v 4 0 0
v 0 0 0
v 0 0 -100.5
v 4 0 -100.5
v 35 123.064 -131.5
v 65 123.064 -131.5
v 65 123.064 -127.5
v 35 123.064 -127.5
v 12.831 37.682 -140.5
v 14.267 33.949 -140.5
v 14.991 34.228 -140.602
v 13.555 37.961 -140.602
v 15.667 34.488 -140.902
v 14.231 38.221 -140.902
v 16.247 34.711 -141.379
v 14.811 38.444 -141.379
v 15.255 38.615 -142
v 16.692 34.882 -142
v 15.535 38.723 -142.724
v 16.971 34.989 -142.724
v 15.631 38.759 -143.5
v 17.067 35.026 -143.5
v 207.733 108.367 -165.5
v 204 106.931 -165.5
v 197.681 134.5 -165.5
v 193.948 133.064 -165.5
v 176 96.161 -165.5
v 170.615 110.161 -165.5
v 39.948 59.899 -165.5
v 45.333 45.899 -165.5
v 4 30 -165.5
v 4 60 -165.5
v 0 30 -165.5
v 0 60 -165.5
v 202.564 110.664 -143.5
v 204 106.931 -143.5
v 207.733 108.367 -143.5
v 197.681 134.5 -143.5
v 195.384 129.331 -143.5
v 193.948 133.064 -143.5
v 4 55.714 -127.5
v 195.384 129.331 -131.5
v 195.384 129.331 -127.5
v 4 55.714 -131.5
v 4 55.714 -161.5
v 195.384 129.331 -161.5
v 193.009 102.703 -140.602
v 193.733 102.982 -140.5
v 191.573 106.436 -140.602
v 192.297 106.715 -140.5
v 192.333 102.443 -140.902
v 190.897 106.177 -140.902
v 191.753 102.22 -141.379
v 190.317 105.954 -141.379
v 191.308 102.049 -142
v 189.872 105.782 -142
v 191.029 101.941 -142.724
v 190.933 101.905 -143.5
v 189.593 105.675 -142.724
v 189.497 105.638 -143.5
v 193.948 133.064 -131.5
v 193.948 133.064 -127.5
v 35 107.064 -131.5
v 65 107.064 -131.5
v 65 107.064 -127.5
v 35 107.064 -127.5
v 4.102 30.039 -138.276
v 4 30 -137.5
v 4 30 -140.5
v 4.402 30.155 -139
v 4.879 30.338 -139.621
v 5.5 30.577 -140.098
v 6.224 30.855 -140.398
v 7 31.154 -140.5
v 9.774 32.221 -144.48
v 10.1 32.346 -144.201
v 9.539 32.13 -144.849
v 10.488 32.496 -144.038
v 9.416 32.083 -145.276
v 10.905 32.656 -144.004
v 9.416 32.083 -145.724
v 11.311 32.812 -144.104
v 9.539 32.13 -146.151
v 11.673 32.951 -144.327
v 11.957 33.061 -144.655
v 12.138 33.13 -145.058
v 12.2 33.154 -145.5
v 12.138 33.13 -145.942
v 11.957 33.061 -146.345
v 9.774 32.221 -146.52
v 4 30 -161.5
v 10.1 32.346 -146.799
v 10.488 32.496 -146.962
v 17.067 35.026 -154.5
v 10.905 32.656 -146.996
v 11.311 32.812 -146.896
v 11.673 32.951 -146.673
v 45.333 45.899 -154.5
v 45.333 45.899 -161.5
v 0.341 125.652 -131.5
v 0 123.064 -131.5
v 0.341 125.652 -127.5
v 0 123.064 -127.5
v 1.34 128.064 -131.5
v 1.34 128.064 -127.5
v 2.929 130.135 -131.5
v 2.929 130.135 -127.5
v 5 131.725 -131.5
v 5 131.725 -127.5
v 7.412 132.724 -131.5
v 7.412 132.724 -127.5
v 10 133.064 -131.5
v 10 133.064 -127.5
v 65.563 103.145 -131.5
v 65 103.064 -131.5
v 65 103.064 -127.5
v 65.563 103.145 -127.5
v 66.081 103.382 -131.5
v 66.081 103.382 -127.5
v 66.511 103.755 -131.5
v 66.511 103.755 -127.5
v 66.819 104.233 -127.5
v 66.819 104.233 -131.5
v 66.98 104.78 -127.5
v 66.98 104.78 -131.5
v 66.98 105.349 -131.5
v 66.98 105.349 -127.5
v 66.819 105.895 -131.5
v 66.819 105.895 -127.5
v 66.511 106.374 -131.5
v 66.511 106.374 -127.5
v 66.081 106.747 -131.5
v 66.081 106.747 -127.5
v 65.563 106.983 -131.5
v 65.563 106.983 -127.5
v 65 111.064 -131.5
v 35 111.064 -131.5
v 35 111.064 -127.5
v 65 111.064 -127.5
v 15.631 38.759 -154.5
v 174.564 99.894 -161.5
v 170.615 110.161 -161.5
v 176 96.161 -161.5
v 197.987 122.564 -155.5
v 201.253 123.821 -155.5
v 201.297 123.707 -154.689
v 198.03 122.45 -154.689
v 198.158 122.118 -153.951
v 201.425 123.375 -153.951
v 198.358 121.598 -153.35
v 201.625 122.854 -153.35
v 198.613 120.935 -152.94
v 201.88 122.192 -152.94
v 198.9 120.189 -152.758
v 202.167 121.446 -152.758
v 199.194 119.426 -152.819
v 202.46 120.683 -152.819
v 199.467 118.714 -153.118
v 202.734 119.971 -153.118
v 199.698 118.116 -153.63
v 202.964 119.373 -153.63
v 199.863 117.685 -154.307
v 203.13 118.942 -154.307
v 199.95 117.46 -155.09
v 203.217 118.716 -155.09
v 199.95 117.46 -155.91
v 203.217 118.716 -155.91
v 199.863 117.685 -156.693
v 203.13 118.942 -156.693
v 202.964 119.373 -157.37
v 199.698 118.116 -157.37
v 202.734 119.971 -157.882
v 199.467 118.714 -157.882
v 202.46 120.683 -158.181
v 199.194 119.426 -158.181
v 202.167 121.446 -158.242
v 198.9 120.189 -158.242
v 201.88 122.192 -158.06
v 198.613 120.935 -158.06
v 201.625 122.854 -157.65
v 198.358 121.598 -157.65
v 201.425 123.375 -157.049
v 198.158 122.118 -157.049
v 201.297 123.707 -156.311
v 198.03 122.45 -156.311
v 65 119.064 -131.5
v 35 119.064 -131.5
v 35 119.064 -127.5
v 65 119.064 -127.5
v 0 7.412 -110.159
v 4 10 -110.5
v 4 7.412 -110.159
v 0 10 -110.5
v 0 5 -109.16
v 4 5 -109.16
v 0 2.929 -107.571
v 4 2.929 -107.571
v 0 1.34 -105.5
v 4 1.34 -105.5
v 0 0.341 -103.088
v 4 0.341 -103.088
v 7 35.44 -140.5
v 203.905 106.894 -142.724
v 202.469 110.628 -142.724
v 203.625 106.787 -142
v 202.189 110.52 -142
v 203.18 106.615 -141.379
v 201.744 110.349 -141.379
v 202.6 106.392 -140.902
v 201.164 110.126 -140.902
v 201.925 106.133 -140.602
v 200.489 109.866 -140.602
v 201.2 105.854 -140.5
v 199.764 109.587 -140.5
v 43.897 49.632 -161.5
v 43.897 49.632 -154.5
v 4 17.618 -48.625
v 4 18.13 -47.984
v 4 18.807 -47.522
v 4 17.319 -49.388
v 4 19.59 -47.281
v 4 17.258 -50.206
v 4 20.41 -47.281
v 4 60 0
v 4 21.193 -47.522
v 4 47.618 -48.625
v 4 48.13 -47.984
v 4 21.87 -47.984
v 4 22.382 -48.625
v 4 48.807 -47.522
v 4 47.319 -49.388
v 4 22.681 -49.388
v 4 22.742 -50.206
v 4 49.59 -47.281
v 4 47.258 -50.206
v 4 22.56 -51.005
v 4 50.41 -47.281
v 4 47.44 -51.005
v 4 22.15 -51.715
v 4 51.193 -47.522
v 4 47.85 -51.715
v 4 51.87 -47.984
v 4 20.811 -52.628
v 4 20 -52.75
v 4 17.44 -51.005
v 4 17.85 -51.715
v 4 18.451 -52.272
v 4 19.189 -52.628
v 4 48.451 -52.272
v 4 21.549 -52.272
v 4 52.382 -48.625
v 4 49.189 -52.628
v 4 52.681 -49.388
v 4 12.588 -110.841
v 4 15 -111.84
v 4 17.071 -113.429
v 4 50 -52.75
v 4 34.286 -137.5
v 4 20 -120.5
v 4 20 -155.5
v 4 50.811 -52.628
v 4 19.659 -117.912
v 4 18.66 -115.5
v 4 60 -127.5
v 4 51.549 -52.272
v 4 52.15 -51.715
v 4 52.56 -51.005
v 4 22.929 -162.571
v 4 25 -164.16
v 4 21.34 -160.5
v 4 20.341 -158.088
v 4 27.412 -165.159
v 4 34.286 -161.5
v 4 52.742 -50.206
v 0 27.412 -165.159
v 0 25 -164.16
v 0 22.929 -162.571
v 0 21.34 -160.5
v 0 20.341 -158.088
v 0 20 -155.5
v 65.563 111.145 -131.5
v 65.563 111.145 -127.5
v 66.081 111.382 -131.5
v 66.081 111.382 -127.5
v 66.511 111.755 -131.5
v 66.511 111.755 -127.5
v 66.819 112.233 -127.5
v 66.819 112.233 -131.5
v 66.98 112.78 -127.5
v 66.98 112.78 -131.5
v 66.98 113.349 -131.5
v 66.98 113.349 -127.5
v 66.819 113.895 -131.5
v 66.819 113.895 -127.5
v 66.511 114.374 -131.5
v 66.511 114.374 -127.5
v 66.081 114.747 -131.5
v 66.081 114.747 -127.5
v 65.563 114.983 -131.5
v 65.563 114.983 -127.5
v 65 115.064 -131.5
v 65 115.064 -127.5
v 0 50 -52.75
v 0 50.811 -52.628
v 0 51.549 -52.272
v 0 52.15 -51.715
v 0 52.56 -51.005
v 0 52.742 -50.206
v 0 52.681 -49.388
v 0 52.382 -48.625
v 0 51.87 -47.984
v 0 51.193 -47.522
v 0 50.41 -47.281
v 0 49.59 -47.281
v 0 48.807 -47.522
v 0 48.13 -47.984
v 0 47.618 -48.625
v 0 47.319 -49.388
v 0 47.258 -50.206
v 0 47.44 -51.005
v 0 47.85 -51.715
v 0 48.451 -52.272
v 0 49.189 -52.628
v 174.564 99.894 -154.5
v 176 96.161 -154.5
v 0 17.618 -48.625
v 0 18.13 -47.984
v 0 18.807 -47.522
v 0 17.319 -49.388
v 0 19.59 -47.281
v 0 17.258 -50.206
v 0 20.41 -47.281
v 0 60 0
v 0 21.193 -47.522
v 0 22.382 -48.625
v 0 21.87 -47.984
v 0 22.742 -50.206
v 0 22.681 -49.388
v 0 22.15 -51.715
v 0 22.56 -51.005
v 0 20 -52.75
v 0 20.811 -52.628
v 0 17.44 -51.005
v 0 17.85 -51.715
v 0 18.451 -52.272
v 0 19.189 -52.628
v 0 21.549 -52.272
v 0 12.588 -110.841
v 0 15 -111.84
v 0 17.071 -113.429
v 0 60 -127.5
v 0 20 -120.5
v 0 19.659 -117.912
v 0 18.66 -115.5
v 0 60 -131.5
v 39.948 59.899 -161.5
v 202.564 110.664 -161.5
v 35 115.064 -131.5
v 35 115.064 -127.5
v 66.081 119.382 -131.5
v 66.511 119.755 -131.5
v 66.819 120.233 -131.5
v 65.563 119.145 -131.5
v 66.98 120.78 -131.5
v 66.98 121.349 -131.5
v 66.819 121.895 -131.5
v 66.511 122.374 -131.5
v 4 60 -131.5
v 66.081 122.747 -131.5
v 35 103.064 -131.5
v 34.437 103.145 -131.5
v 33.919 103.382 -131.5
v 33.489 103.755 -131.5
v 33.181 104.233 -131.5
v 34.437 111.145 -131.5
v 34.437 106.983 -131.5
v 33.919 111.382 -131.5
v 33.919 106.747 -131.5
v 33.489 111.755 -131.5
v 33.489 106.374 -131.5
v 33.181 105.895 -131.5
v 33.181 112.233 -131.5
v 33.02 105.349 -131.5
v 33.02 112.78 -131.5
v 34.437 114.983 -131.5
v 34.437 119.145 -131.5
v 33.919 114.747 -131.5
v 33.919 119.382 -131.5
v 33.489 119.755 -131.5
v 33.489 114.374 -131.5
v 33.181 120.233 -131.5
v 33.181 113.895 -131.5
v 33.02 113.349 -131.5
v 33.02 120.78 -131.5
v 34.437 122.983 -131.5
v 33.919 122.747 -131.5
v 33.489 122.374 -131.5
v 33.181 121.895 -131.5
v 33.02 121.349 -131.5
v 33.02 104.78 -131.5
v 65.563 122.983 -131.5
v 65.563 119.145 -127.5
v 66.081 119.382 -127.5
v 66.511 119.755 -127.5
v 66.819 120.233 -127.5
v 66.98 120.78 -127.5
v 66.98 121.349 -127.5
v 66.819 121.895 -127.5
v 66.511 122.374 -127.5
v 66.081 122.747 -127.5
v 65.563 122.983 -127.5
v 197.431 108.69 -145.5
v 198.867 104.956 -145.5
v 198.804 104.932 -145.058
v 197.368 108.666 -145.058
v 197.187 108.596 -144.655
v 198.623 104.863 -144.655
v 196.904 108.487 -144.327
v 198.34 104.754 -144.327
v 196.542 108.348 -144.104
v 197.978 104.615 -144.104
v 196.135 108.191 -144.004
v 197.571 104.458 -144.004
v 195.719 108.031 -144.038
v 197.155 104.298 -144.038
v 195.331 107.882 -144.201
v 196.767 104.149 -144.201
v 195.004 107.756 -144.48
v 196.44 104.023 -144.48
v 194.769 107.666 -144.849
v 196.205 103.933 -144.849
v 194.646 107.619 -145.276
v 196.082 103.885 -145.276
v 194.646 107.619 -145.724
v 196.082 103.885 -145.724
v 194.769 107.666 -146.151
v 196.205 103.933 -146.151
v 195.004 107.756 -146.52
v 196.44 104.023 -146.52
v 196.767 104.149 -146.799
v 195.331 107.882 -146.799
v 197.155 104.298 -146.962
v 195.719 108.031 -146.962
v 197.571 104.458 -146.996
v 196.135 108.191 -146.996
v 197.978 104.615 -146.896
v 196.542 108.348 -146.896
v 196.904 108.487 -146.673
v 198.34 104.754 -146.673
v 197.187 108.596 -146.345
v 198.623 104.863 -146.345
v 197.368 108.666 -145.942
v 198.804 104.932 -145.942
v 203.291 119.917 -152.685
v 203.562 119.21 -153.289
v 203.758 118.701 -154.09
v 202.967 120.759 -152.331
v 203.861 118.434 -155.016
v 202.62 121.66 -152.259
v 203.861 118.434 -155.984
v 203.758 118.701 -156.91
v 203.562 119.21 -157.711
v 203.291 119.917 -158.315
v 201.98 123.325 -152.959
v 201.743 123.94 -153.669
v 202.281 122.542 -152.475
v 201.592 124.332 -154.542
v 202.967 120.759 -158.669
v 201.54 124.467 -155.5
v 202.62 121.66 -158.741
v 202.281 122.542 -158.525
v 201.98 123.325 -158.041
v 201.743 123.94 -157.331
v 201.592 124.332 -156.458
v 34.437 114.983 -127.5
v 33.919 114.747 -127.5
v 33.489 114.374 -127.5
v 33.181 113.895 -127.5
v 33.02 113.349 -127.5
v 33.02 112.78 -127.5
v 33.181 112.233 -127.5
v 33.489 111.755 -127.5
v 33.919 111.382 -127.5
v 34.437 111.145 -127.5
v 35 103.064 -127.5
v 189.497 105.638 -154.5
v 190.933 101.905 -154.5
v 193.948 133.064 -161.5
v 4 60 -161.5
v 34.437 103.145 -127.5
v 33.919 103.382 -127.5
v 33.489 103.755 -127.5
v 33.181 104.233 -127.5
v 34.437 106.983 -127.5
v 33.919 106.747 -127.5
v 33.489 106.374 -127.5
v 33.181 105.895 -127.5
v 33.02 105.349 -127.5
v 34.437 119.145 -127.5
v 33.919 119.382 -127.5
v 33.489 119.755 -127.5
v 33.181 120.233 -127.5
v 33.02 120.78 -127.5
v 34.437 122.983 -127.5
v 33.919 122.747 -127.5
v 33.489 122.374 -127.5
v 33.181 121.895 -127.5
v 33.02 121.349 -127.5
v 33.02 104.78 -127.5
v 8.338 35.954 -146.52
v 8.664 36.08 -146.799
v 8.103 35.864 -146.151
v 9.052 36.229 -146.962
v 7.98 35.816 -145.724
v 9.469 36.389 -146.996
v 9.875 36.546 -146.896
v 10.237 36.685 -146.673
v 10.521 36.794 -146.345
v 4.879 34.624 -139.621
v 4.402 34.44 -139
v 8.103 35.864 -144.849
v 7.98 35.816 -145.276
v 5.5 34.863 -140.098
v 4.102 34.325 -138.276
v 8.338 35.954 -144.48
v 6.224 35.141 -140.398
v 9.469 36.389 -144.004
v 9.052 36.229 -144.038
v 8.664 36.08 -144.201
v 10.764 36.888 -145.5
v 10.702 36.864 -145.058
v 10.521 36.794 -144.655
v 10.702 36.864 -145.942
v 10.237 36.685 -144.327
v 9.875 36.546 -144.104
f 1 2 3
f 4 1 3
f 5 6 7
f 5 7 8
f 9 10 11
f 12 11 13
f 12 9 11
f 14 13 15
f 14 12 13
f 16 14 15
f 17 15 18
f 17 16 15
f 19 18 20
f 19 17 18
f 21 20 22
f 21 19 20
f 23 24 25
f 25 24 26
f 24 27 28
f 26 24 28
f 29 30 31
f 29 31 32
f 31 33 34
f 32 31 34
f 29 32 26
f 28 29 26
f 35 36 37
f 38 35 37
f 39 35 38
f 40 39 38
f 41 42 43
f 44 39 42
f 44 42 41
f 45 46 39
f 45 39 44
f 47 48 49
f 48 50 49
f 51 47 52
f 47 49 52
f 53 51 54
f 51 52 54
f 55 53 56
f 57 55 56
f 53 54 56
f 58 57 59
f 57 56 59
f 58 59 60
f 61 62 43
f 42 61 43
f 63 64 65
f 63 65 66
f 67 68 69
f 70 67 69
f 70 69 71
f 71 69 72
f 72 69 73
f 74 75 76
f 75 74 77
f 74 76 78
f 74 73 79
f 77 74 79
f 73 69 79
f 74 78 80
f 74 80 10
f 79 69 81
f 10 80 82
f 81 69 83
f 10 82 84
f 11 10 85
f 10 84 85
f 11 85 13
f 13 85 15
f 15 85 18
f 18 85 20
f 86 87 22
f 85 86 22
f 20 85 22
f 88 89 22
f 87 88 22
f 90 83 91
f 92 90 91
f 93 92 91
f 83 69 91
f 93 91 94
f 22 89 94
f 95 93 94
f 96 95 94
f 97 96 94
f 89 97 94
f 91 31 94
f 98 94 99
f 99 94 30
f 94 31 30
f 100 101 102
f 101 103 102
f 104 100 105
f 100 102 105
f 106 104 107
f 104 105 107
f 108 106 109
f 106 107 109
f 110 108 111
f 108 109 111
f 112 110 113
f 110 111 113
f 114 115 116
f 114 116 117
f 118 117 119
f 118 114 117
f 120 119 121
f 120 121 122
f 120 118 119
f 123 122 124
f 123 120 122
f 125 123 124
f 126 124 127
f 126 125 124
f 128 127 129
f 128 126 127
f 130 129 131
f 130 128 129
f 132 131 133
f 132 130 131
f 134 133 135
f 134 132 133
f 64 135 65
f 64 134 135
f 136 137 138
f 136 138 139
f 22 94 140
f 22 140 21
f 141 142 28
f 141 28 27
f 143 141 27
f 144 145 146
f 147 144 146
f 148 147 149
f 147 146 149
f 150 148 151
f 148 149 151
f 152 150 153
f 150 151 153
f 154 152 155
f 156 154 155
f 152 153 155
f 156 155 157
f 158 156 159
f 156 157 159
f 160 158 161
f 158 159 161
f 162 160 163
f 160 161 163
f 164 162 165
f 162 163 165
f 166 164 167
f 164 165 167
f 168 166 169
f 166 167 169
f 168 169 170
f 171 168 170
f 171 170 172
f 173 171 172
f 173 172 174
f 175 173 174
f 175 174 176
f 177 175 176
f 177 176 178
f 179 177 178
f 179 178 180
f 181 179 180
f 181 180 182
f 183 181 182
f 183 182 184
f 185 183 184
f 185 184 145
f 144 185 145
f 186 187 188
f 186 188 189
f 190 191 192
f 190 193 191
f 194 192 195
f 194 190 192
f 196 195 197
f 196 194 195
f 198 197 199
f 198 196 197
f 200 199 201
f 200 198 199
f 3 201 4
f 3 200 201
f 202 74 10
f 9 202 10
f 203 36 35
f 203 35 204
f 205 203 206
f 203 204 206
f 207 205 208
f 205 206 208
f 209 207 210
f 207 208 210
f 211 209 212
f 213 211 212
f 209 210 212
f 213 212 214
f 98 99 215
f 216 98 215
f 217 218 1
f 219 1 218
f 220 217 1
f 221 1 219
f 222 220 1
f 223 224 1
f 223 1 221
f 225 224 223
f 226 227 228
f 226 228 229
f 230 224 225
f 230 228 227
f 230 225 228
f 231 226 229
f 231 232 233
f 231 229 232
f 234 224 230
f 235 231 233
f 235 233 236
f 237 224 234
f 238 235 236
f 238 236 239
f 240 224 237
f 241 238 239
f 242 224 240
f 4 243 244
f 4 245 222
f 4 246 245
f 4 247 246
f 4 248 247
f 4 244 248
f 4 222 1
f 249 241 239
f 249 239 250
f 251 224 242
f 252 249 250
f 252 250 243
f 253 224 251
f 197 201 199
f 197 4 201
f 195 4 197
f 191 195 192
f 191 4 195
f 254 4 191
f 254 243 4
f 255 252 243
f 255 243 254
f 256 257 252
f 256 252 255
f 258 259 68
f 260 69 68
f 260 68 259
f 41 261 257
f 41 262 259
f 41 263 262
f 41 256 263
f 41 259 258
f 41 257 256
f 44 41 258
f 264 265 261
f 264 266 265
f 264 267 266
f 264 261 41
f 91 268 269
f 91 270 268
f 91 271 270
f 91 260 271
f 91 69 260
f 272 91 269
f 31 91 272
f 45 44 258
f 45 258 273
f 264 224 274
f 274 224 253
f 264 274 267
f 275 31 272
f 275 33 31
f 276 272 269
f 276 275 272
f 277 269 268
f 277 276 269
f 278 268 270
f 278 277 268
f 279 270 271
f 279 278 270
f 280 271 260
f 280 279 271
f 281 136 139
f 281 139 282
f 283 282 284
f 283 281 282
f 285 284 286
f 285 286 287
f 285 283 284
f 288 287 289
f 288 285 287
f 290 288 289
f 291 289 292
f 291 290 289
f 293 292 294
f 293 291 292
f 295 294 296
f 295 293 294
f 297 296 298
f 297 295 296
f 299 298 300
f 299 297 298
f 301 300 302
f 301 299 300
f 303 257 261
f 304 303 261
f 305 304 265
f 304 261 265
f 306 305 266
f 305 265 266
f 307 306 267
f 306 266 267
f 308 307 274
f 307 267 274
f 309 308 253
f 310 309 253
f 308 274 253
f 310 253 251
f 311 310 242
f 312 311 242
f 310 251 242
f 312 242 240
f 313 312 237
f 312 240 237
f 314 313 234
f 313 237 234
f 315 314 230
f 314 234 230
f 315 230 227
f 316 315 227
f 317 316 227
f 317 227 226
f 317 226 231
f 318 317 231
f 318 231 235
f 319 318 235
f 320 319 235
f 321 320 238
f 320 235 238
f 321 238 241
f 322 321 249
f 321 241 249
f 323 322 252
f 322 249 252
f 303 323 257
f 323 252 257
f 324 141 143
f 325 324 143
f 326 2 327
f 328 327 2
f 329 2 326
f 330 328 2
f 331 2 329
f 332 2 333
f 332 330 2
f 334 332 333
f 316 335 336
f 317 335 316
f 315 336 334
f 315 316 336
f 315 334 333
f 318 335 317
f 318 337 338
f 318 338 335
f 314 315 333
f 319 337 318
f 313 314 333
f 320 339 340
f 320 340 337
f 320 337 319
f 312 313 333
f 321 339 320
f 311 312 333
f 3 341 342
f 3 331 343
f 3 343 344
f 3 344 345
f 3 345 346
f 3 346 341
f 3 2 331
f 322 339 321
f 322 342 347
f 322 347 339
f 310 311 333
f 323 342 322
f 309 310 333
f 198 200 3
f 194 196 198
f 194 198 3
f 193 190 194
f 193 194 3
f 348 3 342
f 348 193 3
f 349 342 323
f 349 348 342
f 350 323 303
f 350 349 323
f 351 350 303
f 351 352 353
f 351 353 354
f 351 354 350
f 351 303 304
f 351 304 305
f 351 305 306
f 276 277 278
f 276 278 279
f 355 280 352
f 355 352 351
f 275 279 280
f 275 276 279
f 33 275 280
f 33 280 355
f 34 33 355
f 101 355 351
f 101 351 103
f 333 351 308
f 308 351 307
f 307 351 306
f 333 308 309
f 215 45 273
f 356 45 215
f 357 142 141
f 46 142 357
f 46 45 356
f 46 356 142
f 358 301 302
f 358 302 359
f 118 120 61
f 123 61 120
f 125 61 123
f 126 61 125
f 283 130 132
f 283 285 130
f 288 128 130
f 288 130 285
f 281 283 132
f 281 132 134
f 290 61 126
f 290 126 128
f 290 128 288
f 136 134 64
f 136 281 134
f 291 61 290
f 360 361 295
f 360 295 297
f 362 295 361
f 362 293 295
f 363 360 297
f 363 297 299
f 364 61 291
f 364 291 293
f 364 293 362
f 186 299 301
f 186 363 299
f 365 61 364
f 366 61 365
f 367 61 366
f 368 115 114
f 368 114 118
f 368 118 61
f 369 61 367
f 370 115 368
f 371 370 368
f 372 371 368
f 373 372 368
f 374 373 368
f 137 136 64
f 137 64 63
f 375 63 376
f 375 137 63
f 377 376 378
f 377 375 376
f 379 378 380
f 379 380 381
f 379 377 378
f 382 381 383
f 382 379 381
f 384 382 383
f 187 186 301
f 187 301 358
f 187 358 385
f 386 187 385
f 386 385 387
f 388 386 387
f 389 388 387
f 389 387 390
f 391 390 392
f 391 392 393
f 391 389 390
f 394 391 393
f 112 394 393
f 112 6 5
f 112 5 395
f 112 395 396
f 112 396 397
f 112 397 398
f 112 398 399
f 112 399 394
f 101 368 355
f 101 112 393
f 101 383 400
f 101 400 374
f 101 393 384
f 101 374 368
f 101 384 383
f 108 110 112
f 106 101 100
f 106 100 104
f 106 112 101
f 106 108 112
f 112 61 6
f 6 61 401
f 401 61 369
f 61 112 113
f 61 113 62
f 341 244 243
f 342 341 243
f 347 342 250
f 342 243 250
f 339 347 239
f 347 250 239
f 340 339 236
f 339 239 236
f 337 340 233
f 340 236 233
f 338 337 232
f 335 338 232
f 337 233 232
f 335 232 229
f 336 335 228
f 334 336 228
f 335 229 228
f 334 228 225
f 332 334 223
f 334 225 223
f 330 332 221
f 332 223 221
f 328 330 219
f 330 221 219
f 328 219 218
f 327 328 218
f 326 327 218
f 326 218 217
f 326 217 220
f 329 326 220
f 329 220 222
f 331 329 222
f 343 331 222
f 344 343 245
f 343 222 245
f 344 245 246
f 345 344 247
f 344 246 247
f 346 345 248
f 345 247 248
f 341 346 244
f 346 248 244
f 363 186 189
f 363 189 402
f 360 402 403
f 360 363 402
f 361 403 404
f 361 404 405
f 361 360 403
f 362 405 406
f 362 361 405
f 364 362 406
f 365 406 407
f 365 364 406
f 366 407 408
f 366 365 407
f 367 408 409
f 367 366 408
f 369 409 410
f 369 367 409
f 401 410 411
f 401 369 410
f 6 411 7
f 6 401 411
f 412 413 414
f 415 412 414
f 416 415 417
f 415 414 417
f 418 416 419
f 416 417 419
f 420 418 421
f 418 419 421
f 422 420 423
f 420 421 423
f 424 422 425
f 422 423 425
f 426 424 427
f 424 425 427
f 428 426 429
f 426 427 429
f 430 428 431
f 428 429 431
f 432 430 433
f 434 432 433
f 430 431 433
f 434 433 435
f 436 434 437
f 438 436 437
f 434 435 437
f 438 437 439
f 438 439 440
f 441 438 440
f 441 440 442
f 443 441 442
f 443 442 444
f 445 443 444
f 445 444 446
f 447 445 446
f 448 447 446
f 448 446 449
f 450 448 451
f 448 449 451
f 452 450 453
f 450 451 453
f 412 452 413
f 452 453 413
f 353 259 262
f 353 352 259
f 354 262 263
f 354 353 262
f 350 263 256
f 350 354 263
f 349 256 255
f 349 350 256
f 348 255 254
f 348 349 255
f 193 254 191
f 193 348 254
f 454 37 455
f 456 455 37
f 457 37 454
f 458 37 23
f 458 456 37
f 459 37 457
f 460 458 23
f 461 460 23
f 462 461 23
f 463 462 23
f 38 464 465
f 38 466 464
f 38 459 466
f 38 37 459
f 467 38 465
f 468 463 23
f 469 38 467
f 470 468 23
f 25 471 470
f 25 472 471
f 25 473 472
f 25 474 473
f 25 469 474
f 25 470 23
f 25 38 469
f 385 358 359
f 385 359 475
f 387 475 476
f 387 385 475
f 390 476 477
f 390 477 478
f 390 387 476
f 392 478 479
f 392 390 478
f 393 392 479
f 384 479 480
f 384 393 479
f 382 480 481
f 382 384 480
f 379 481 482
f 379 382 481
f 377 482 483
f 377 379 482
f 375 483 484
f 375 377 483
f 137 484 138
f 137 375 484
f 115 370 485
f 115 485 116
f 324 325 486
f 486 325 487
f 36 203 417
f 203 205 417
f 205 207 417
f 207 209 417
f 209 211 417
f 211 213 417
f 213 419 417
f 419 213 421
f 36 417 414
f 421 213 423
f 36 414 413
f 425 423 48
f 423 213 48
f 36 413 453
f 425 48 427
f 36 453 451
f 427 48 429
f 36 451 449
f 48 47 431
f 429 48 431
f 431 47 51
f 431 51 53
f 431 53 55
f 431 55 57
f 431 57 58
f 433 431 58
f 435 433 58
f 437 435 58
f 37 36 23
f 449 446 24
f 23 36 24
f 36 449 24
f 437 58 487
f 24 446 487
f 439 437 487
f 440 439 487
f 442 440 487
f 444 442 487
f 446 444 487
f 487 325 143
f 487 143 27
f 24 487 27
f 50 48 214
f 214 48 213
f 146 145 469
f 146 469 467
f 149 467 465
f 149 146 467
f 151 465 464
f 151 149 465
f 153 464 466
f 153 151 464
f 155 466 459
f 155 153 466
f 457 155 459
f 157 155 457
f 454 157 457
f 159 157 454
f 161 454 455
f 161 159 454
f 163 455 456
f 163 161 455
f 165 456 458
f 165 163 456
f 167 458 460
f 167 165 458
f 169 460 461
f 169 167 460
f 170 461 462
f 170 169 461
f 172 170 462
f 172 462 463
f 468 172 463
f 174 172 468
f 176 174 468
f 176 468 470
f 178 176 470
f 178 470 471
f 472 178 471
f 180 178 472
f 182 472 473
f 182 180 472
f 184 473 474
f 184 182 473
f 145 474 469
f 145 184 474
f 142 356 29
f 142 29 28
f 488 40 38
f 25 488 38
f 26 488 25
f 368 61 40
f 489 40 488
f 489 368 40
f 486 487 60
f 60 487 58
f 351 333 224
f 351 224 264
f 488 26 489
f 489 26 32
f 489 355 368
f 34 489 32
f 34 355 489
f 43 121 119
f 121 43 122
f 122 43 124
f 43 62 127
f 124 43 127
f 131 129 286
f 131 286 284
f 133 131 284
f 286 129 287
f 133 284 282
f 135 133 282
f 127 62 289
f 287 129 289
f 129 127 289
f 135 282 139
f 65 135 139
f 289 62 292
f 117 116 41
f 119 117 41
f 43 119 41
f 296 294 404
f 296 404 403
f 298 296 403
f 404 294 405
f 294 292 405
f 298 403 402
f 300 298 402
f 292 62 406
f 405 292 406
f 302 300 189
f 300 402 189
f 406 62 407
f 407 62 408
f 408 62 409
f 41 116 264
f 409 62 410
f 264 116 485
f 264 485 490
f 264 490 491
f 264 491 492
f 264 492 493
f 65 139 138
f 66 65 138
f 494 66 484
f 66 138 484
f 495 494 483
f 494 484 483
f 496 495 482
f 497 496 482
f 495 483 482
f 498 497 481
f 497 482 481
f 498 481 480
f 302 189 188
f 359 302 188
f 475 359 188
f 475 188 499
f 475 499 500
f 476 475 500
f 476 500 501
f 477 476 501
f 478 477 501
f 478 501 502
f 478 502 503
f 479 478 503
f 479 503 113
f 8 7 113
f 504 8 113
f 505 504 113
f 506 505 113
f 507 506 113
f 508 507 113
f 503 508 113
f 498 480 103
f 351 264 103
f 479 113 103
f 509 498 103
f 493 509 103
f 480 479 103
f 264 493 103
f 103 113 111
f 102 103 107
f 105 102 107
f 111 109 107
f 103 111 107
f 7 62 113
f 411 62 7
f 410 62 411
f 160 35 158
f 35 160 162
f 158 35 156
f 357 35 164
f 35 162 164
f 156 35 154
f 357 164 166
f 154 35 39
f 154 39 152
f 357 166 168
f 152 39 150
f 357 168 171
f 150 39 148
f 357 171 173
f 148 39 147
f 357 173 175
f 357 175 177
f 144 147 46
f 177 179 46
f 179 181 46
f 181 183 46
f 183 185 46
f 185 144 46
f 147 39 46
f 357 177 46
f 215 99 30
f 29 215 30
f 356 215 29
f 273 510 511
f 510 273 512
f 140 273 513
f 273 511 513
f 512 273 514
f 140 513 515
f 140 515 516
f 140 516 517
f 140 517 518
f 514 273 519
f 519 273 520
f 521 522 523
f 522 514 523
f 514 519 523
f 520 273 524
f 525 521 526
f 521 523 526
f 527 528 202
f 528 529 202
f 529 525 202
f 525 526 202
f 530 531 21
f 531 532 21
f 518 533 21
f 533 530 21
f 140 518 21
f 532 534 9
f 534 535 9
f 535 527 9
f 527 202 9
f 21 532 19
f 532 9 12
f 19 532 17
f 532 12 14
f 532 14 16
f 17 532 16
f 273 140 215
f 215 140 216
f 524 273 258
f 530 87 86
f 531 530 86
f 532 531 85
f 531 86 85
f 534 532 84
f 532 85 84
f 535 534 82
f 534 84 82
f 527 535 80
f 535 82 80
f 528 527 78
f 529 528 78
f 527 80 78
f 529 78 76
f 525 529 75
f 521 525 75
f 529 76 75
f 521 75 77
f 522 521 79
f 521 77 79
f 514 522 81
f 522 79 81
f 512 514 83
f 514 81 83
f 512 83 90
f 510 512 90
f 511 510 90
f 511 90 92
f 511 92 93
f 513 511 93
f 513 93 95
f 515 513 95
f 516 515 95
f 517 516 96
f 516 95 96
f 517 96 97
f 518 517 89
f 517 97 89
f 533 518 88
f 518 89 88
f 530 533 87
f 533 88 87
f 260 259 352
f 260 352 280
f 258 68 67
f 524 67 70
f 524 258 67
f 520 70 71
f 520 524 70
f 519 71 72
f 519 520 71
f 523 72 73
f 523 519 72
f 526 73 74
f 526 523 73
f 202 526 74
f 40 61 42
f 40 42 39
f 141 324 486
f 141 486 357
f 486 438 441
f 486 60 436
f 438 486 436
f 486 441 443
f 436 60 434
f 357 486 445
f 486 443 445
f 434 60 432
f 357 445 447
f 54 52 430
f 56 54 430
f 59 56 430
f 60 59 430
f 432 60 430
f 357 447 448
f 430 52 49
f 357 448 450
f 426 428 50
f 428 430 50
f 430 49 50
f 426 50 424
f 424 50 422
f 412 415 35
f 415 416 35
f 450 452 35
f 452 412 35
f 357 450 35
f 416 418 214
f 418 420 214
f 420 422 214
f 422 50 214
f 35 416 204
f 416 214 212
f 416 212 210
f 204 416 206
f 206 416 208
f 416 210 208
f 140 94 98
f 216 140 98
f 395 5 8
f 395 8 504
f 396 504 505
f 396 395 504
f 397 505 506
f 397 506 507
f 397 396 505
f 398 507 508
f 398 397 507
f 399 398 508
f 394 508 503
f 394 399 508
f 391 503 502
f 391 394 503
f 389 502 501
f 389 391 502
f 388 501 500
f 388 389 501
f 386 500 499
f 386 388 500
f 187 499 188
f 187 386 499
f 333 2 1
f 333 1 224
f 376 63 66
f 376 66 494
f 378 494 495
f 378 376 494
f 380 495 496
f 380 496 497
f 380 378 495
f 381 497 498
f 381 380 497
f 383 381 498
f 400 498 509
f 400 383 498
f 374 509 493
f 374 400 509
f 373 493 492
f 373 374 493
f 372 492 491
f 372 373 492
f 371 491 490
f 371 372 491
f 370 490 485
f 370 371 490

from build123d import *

# Parameters (mm, degrees)
SKETCH_1_W          = 165.5
SKETCH_1_H          = 60
EXTRUDE_1_DEPTH     = 4
EXTRUDE_2_DEPTH     = 4
SKETCH_3_W          = 214.285714285
SKETCH_3_H          = 25
EXTRUDE_5_DEPTH     = 4
SKETCH_4_R          = 2.75
CUT_EXTRUDE_1_DEPTH = 4
SKETCH_5_W          = 55
SKETCH_5_H          = 20
CUT_EXTRUDE_2_DEPTH = 4
FILLET_1_R          = 10
SKETCH_6_W          = 186.285714285
SKETCH_6_H          = 14
CUT_EXTRUDE_3_DEPTH = 4
SKETCH_7_R          = 1.5
CUT_EXTRUDE_4_DEPTH = 4
FILLET_2_R          = 3
CUT_EXTRUDE_5_DEPTH = 293.240221501
CUT_EXTRUDE_6_DEPTH = 10
SKETCH_11_W         = 207.248718004
SKETCH_11_H         = 34
EXTRUDE_6_DEPTH     = 4
EXTRUDE_7_DEPTH     = 4
FILLET_3_R          = 10
CUT_EXTRUDE_7_DEPTH = 4
SKETCH_15_W         = 22
SKETCH_15_H         = 28
EXTRUDE_8_DEPTH     = 4
SKETCH_16_R         = 2.75
CUT_EXTRUDE_8_DEPTH = 10
CHAMFER_1_SIZE      = 0.5


with BuildPart() as part:
    # 草图1 → 凸台-拉伸1 (new body)
    with BuildSketch(Plane(origin=(0, 0, 0), x_dir=(0, 0, -1), z_dir=(1, 0, 0))):
        with Locations((82.75, 30)):
            Rectangle(SKETCH_1_W, SKETCH_1_H)
    extrude(amount=EXTRUDE_1_DEPTH)

    # 草图2 → 凸台-拉伸2 (add)
    with BuildSketch(Plane(origin=(0, 0, -165.5), x_dir=(-1, 0, 0), z_dir=(0, 0, -1))):
        Polygon((-4, 30), (-204, 106.930925816), (-193.94769236, 133.06425915), (-4, 60), align=None)
    extrude(amount=-EXTRUDE_2_DEPTH)

    # 草图3 → 凸台-拉伸5 (add)
    with BuildSketch(Plane(origin=(-9.536752084, 24.793025648, 0), x_dir=(0.9333333333333335, 0.3590109871422999, 0), z_dir=(0.3590109871422999, -0.9333333333333335, 0))):
        with Locations((121.646520091, -153)):
            Rectangle(SKETCH_3_W, SKETCH_3_H)
    extrude(amount=-EXTRUDE_5_DEPTH)

    # 草图4 → 切除-拉伸1 (cut)
    with BuildSketch(Plane(origin=(4, 0, 0), x_dir=(0, 0, -1), z_dir=(1, 0, 0))):
        with Locations((50, 50)):
            Circle(SKETCH_4_R)
        with Locations((50, 20)):
            Circle(SKETCH_4_R)
    extrude(amount=-CUT_EXTRUDE_1_DEPTH, mode=Mode.SUBTRACT)

    # 草图5 → 切除-拉伸2 (cut)
    with BuildSketch(Plane(origin=(4, 0, 0), x_dir=(0, 0, -1), z_dir=(1, 0, 0))):
        with Locations((138, 10)):
            Rectangle(SKETCH_5_W, SKETCH_5_H)
    extrude(amount=-CUT_EXTRUDE_2_DEPTH, mode=Mode.SUBTRACT)

    # 圆角1
    fillet_1_edges = [part.edges().sort_by_distance(p)[0] for p in [
        (2, 20, -165.5),
        (2, 20, -110.5),
        (2, 0, -110.5),
    ]]
    fillet(fillet_1_edges, radius=FILLET_1_R - 0.0001)  # a hair under: the kernel refuses the full size

    # 草图6 → 切除-拉伸3 (cut)
    with BuildSketch(Plane(origin=(-9.536752084, 24.793025648, 0), x_dir=(0.9333333333333335, 0.35901098714229984, 0), z_dir=(0.35901098714229984, -0.9333333333333335, 0))):
        with Locations((121.646520091, -147.5)):
            Rectangle(SKETCH_6_W, SKETCH_6_H)
    extrude(amount=-CUT_EXTRUDE_3_DEPTH, mode=Mode.SUBTRACT)

    # 草图7 → 切除-拉伸4 (cut)
    with BuildSketch(Plane(origin=(-9.536752084, 24.793025648, 0), x_dir=(0.9333333333333335, 0.35901098714229984, 0), z_dir=(0.35901098714229984, -0.9333333333333335, 0))):
        with Locations((221.789377233, -145.5)):
            Circle(SKETCH_7_R)
        with Locations((21.789377233, -145.5)):
            Circle(SKETCH_7_R)
    extrude(amount=-CUT_EXTRUDE_4_DEPTH, mode=Mode.SUBTRACT)

    # 圆角2
    fillet_2_edges = [part.edges().sort_by_distance(p)[0] for p in [
        (4, 32.142857143, -140.5),
        (203.281978026, 108.797592483, -140.5),
        (16.348644692, 36.892820487, -140.5),
        (190.215311359, 103.771438663, -140.5),
    ]]
    fillet(fillet_2_edges, radius=FILLET_2_R)

    # 草图8 → 切除-拉伸5 (cut, through all)
    with BuildSketch(Plane.XY.offset(-161.5)):
        Polygon((45.333333333, 45.899058002), (39.948168526, 59.899058002), (170.614835193, 110.160596202), (176, 96.160596202), align=None)
    extrude(amount=-CUT_EXTRUDE_5_DEPTH, mode=Mode.SUBTRACT)

    # 草图9 → 切除-拉伸6 (cut)
    with BuildSketch(Plane(origin=(0, 0, -161.5), x_dir=(-1, 0, 0), z_dir=(0, 0, -1))):
        Polygon((-43.897289385, 49.632391335), (-174.563956051, 99.893929535), (-176, 96.160596202), (-45.333333333, 45.899058002), align=None)
    extrude(amount=-CUT_EXTRUDE_6_DEPTH, mode=Mode.SUBTRACT)

    # 草图11 → 凸台-拉伸6 (add)
    with BuildSketch(Plane(origin=(-19.589059724, 50.926358981, 0), x_dir=(0.9333333333333335, 0.3590109871422999, 0), z_dir=(-0.3590109871422999, 0.9333333333333335, 0))):
        with Locations((125.165018231, 148.5)):
            Rectangle(SKETCH_11_W, SKETCH_11_H)
    extrude(amount=-EXTRUDE_6_DEPTH)

    # 草图12 → 凸台-拉伸7 (add)
    with BuildSketch(Plane.XY.offset(-131.5)):
        Polygon((4, 55.714285714), (4, 60), (0, 60), (0, 133.06425915), (193.94769236, 133.06425915), (195.383736309, 129.330925816), align=None)
    extrude(amount=EXTRUDE_7_DEPTH)

    # 圆角3
    fillet_3_edges = [part.edges().sort_by_distance(p)[0] for p in [
        (0, 133.06425915, -129.5),
    ]]
    fillet(fillet_3_edges, radius=FILLET_3_R)

    # 草图14 → 切除-拉伸7 (cut)
    with BuildSketch(Plane(origin=(0, 0, -131.5), x_dir=(-1, 0, 0), z_dir=(0, 0, -1))):
        with BuildLine():
            Line((-65, 123.06425915), (-35, 123.06425915))
            ThreePointArc((-35, 123.06425915), (-33, 121.06425915), (-35, 119.06425915))
            Line((-35, 119.06425915), (-65, 119.06425915))
            ThreePointArc((-65, 119.06425915), (-67, 121.06425915), (-65, 123.06425915))
        make_face()
        with BuildLine():
            Line((-65, 115.06425915), (-35, 115.06425915))
            ThreePointArc((-35, 115.06425915), (-33, 113.06425915), (-35, 111.06425915))
            Line((-35, 111.06425915), (-65, 111.06425915))
            ThreePointArc((-65, 111.06425915), (-67, 113.06425915), (-65, 115.06425915))
        make_face()
        with BuildLine():
            Line((-65, 107.06425915), (-35, 107.06425915))
            ThreePointArc((-35, 107.06425915), (-33, 105.06425915), (-35, 103.06425915))
            Line((-35, 103.06425915), (-65, 103.06425915))
            ThreePointArc((-65, 103.06425915), (-67, 105.06425915), (-65, 107.06425915))
        make_face()
    extrude(amount=-CUT_EXTRUDE_7_DEPTH, mode=Mode.SUBTRACT)

    # 草图15 → 凸台-拉伸8 (add)
    with BuildSketch(Plane(origin=(213.536752084, 82.137900168, 0), x_dir=(0, 0, -1), z_dir=(0.9333333333333338, 0.35901098714229945, 0))):
        with Locations((154.5, 40.563956051)):
            Rectangle(SKETCH_15_W, SKETCH_15_H)
    extrude(amount=EXTRUDE_8_DEPTH)

    # 草图16 → 切除-拉伸8 (cut)
    with BuildSketch(Plane(origin=(217.270085418, 83.573944117, 0), x_dir=(0, 0, -1), z_dir=(0.9333333333333335, 0.35901098714229984, 0))):
        with Locations(Location((155.5, 40.563956051, 0), (0, 0, 90))):
            Circle(SKETCH_16_R)
    extrude(amount=-CUT_EXTRUDE_8_DEPTH, mode=Mode.SUBTRACT)

    # 倒角1
    chamfer_1_edges = [part.edges().sort_by_distance(p)[0] for p in [
        (203.694459728, 118.866969765, -155.5),
    ]]
    chamfer(chamfer_1_edges, length=CHAMFER_1_SIZE)


solid = part.part
